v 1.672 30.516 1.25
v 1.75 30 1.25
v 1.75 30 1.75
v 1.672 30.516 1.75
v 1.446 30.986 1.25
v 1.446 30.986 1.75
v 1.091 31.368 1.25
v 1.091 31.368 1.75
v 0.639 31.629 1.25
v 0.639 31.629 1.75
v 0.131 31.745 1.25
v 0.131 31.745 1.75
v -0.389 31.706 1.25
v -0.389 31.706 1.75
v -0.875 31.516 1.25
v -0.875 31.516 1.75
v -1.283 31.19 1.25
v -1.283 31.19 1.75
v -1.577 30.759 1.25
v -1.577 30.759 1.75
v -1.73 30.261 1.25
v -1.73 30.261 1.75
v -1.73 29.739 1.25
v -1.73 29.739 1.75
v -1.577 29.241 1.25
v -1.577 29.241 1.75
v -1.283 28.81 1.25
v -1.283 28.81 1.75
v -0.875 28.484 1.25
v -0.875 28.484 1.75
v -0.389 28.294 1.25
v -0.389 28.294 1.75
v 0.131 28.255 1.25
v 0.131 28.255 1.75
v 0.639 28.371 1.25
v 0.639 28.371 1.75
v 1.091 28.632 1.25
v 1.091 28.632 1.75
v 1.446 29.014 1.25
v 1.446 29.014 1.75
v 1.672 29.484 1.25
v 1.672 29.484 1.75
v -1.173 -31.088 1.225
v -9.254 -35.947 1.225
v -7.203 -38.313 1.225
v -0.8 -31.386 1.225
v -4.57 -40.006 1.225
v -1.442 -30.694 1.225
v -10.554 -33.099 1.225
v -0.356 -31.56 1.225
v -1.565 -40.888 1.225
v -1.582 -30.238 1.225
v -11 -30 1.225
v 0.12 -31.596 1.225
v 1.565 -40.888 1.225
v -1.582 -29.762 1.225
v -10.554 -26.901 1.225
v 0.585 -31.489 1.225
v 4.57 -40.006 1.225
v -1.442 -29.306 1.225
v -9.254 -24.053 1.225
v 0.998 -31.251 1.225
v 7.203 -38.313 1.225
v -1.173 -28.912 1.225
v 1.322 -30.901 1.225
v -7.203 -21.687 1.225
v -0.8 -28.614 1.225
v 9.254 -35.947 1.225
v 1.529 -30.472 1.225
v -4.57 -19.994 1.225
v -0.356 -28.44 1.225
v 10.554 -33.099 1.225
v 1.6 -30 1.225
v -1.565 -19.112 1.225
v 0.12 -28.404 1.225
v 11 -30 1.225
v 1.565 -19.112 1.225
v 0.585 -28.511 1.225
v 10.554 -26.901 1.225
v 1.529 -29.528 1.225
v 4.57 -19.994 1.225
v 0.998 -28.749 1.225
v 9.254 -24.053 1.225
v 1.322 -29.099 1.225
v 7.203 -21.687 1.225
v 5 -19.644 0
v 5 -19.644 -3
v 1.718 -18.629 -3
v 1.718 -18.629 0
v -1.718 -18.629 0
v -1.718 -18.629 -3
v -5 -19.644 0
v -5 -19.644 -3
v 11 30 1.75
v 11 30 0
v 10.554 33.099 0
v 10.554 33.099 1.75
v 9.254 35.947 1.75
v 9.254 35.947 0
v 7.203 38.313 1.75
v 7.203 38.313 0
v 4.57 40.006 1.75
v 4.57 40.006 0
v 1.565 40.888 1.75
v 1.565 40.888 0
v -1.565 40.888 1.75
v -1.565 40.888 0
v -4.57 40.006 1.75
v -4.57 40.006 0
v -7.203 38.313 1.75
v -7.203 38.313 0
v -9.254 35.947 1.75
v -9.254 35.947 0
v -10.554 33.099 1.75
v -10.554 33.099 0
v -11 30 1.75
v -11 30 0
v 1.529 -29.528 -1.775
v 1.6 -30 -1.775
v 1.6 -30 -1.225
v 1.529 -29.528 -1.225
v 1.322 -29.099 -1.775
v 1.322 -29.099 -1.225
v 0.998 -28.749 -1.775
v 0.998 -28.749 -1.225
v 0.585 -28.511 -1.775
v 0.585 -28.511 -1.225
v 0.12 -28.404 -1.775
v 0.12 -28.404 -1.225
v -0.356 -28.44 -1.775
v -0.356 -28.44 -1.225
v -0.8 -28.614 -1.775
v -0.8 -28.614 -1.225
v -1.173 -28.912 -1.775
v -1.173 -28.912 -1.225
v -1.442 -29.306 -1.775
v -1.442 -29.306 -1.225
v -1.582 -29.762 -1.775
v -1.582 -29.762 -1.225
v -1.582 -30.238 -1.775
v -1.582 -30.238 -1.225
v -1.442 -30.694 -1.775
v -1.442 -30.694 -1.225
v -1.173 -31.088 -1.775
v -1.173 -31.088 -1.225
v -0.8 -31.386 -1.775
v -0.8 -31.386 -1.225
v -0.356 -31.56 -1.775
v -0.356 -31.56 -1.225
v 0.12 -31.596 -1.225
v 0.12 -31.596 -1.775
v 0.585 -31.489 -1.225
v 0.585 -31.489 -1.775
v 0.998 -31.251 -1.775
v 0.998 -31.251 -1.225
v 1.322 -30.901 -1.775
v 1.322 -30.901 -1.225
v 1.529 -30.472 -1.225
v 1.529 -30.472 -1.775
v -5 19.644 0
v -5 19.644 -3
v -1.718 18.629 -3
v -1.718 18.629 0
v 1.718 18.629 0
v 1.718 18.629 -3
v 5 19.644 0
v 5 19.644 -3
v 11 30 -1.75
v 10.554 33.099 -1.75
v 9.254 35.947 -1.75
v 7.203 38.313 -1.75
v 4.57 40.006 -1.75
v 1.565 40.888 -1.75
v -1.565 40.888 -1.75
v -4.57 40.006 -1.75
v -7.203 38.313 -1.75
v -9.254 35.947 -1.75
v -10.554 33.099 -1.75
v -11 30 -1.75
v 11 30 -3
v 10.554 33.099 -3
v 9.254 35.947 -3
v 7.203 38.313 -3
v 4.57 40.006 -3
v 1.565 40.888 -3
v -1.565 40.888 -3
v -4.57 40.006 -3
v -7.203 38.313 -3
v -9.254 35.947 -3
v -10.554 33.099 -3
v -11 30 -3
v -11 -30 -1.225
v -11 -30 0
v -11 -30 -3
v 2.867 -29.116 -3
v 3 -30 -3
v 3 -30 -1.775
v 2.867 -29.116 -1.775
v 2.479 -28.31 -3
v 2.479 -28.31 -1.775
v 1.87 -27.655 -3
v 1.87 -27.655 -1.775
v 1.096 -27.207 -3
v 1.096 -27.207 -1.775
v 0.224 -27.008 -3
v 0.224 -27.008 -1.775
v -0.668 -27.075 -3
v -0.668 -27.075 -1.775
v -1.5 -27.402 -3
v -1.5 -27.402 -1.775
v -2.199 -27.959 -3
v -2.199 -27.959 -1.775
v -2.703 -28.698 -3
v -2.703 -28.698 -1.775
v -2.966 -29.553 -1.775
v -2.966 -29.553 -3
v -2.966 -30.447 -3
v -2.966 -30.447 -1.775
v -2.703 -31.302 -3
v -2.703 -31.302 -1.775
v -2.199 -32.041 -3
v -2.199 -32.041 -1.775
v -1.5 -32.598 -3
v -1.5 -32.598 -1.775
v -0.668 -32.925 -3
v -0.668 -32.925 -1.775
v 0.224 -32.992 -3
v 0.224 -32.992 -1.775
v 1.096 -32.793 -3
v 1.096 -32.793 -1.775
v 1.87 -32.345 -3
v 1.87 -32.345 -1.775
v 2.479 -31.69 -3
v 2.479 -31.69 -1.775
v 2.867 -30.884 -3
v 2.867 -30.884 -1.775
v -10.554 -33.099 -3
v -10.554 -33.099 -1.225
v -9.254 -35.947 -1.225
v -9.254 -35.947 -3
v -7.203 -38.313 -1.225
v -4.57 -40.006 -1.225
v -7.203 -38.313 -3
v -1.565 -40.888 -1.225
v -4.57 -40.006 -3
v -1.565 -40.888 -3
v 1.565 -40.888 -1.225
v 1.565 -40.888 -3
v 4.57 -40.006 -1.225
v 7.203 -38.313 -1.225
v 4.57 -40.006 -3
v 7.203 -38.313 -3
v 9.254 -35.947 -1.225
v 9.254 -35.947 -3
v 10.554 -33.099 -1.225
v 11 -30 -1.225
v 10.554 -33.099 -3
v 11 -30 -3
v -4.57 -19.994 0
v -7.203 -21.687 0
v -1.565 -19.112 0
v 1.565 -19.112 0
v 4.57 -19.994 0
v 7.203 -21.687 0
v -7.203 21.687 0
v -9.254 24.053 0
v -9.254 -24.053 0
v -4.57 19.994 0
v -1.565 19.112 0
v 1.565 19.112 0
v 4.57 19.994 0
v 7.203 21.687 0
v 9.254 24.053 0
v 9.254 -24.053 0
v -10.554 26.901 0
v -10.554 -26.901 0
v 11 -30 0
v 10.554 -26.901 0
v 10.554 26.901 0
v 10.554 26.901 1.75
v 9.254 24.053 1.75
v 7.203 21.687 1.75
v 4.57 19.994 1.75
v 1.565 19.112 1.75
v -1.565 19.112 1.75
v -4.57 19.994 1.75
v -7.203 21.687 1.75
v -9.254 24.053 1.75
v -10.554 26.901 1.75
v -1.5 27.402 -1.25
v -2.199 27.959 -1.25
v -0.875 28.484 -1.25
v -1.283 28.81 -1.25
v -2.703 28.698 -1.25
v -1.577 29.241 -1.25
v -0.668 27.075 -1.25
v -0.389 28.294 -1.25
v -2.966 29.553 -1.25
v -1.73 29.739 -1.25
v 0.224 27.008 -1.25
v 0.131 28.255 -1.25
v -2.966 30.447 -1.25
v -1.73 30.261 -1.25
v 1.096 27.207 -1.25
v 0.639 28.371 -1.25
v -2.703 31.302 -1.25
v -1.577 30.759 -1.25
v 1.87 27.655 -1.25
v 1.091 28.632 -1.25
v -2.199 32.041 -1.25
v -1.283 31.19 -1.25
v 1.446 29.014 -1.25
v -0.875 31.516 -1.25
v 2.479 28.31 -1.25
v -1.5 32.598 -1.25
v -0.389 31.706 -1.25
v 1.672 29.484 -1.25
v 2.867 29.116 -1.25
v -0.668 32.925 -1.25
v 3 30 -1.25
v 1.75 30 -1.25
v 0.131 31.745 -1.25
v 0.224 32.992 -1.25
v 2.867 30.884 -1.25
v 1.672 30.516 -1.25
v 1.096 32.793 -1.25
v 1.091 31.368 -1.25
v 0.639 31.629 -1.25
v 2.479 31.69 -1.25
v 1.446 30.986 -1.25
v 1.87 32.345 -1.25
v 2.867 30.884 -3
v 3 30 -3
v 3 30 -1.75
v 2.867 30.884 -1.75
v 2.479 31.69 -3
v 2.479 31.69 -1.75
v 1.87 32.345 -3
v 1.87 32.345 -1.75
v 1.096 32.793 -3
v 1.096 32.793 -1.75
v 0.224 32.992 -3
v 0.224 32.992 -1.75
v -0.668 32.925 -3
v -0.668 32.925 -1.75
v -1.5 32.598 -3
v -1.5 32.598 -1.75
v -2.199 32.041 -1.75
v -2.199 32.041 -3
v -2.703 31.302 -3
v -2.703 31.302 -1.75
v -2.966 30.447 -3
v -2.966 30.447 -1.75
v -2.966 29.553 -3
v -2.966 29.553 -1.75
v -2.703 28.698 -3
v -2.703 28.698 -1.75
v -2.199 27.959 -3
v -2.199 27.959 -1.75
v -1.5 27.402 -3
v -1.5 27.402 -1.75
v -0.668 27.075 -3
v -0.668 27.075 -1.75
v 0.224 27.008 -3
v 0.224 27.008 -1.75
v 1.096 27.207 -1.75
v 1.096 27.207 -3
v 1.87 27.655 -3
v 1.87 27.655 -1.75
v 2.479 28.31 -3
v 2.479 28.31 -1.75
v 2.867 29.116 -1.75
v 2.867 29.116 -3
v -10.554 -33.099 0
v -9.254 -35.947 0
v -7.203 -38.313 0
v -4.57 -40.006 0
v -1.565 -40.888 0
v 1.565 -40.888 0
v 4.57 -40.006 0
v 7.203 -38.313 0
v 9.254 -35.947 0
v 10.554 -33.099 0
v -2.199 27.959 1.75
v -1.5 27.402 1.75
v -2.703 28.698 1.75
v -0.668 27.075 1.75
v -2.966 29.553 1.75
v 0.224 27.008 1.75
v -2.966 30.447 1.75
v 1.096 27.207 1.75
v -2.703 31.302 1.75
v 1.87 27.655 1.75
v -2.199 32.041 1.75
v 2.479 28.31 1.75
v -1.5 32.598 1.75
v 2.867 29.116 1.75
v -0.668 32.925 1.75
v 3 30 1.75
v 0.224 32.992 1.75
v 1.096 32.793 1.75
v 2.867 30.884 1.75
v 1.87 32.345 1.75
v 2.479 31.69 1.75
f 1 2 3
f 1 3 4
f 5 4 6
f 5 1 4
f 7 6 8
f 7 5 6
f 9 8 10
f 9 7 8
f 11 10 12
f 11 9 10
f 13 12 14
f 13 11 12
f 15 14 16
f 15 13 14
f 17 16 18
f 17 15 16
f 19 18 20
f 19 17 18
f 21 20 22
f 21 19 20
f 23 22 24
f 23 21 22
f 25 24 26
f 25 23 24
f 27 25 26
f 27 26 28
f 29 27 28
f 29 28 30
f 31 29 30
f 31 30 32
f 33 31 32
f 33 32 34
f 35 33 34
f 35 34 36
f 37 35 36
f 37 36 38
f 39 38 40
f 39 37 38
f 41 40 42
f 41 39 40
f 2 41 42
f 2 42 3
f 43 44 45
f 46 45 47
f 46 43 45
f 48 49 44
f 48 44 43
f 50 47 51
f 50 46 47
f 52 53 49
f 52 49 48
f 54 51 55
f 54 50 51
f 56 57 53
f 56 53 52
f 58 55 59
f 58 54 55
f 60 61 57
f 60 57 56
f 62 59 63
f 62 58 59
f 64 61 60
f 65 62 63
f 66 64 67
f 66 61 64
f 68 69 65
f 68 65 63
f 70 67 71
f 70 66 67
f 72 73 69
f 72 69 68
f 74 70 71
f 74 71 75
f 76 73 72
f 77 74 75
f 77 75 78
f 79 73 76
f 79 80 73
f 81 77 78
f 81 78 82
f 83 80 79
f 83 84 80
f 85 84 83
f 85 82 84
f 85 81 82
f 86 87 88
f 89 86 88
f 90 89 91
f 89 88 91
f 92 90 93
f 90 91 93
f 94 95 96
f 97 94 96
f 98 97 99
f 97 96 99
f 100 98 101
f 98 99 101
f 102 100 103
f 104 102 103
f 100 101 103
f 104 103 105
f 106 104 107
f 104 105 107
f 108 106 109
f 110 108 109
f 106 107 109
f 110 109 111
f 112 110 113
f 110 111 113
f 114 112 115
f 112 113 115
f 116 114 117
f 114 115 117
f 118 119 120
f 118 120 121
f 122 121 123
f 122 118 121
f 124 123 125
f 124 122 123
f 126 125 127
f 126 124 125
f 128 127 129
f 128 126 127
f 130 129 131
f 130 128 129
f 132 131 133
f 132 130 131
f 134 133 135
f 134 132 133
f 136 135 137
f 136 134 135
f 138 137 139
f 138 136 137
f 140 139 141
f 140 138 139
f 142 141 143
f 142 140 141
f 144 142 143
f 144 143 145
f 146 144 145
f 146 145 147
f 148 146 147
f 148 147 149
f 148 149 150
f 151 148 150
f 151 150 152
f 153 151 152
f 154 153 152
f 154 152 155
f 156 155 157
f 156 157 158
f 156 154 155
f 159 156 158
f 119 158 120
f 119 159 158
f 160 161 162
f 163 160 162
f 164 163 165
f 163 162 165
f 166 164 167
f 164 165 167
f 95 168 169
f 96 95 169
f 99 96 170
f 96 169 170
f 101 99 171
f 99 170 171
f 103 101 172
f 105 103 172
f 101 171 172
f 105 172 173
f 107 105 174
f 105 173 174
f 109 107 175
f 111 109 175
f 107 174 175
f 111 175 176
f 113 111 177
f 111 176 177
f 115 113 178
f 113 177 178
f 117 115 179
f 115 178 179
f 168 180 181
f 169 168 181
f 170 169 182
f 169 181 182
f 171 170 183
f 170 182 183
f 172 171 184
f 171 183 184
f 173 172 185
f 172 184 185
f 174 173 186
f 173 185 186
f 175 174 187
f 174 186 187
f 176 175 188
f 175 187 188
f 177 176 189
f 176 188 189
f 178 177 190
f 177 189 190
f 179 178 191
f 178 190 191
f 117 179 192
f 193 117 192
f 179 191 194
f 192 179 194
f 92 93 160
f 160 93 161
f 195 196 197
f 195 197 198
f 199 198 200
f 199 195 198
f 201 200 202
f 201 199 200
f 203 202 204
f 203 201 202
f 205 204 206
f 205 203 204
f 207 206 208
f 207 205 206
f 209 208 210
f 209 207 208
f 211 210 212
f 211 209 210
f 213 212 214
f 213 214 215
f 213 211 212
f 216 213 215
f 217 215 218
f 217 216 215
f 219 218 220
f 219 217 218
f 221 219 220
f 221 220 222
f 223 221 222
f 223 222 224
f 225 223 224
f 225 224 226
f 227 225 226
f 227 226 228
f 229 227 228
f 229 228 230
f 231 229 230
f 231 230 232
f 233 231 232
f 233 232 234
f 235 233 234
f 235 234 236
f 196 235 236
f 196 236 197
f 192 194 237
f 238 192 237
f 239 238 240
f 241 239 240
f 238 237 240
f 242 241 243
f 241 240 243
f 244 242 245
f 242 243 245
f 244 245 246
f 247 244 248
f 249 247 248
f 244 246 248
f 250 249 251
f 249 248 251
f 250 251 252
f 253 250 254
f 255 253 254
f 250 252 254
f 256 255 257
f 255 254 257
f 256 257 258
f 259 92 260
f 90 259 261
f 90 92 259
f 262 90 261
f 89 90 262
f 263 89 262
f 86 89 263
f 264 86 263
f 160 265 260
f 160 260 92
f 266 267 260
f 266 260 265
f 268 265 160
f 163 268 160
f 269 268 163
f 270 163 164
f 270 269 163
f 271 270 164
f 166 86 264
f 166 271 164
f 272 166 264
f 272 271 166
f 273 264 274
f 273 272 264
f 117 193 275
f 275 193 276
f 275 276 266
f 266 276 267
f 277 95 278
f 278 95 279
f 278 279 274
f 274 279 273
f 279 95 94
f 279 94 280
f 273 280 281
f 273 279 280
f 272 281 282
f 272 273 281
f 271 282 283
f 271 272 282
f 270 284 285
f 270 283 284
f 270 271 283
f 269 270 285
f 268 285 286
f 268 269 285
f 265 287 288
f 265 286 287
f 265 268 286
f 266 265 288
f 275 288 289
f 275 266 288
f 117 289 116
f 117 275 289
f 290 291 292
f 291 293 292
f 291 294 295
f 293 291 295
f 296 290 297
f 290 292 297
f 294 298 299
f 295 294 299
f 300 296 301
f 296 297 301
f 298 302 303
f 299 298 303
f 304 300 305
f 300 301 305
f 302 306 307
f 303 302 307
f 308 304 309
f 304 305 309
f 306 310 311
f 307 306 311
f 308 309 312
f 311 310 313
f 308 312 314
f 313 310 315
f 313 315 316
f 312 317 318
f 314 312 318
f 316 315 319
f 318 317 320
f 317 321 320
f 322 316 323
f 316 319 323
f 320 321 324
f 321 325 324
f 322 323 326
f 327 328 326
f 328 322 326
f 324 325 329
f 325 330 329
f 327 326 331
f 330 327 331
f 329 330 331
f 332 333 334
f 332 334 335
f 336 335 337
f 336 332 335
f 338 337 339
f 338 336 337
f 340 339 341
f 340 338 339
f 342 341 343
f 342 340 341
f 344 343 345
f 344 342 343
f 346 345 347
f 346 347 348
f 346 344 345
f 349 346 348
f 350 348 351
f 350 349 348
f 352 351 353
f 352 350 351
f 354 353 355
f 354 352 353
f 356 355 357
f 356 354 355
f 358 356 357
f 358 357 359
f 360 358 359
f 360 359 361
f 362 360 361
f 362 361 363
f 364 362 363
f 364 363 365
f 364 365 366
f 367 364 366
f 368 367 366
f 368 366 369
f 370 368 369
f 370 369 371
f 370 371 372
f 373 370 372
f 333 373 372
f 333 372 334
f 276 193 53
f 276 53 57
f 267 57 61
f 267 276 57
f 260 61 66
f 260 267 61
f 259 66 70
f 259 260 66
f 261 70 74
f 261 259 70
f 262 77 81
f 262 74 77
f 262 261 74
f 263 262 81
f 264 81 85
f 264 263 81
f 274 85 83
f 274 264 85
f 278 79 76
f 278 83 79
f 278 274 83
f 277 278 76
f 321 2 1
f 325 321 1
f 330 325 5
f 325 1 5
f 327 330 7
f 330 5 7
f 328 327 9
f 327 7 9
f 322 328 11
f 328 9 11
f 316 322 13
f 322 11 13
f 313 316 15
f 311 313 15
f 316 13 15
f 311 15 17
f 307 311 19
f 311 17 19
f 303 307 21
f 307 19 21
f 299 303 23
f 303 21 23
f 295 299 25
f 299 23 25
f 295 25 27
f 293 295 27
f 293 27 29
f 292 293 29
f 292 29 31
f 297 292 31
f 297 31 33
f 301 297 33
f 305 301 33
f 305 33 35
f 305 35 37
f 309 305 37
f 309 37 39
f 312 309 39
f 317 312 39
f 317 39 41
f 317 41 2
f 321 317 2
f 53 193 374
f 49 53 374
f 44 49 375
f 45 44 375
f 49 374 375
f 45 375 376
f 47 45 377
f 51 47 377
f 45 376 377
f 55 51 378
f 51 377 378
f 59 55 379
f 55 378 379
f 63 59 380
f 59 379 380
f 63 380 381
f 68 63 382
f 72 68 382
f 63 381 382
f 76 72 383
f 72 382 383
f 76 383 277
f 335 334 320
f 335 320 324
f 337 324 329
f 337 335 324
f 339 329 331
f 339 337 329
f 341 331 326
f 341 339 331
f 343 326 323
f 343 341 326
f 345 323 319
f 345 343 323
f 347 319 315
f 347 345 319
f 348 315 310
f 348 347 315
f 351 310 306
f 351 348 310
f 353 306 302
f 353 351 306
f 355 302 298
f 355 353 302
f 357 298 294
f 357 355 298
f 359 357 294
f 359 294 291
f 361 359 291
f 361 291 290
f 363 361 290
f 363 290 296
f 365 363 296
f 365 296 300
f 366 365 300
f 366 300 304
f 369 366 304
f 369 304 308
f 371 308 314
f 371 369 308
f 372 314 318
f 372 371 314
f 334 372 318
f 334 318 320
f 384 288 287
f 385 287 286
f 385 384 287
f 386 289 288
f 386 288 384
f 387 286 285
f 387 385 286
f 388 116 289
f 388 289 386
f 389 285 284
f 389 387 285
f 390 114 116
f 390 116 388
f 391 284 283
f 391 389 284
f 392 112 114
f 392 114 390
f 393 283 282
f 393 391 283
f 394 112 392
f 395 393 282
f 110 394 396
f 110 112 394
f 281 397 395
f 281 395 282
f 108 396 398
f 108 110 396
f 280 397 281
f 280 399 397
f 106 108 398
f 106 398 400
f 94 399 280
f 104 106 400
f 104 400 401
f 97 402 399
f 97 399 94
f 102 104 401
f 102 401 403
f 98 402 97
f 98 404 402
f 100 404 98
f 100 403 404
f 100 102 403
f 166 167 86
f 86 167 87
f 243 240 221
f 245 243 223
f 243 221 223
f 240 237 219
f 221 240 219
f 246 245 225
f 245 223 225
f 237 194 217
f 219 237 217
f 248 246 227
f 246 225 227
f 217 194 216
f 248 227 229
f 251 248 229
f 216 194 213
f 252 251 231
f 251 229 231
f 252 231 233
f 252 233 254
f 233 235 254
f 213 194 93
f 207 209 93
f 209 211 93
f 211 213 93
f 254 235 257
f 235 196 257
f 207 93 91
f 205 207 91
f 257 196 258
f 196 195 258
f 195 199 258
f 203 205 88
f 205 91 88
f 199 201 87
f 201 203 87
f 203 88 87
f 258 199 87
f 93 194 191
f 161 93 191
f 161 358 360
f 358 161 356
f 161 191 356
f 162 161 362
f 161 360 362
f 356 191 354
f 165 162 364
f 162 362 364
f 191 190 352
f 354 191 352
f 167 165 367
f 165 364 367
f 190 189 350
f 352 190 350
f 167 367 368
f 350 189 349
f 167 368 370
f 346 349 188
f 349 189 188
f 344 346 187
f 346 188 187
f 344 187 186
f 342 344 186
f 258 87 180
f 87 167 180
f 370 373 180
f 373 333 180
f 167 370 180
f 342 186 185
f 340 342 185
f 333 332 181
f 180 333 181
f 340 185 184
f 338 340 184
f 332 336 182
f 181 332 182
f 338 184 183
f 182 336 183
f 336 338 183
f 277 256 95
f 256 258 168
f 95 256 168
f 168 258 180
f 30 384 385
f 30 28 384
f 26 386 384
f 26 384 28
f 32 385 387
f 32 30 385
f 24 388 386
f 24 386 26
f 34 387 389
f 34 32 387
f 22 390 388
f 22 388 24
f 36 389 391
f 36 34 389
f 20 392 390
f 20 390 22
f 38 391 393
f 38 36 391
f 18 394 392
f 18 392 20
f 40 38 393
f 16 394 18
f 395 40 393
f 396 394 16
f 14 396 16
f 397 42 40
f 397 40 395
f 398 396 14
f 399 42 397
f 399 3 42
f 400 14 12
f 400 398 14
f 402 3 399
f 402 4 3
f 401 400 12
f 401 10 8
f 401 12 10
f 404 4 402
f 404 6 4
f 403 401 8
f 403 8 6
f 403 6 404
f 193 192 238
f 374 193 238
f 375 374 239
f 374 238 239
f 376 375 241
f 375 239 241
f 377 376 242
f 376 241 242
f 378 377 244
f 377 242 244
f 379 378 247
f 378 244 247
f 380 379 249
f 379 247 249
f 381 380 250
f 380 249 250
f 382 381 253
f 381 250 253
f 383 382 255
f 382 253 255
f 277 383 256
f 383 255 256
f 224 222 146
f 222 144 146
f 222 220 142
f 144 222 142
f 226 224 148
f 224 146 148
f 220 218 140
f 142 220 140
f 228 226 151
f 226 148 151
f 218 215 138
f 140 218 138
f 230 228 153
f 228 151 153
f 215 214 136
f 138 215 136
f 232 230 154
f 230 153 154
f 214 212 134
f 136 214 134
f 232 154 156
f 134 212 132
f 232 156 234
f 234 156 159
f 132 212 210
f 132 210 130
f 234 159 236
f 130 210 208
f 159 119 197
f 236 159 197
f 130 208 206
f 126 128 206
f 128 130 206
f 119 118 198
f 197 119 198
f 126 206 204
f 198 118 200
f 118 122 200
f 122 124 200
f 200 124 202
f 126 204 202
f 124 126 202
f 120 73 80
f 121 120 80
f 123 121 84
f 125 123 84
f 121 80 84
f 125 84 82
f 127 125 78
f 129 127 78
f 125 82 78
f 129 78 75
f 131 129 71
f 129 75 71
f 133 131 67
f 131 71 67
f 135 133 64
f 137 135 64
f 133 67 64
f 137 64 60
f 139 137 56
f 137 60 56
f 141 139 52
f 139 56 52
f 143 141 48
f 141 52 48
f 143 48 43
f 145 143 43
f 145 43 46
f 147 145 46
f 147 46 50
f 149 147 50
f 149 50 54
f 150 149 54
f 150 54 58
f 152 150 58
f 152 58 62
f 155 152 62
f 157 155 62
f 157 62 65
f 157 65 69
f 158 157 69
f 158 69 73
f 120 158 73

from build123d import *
from build123d.topology import SkipClean

# Parameters (mm, degrees)
BOSS_EXTRUDE1_DEPTH           = 3
BOSS_EXTRUDE2_START           = -1.75
SKETCH1_3_R                   = 11
BOSS_EXTRUDE2_DEPTH           = 1.75
SKETCH2_R                     = 1.75
CUT_EXTRUDE1_DEPTH            = 4.75
SKETCH2_3_R                   = 3
CUT_EXTRUDE2_DEPTH            = 1.75
BOSS_EXTRUDE3_START           = -1.225
SKETCH1_4_R                   = 11
BOSS_EXTRUDE3_DEPTH           = 1.225
SKETCH3_R                     = 1.6
CUT_EXTRUDE3_DEPTH            = 4.225
SKETCH3_3_R                   = 3
SKETCH3_3_R_2                 = 1.6
CUT_EXTRUDE4_DEPTH            = 1.225
BODY_MOVE_COPY1_DEPTH         = 3
BODY_MOVE_COPY1_START         = 1.75
BODY_MOVE_COPY1_2_OUTLINE_R   = 11
BODY_MOVE_COPY1_2_OUTLINE_R_2 = 1.6
BODY_MOVE_COPY1_2_OUTLINE_R_3 = 3
BODY_MOVE_COPY1_2_DEPTH       = 1.25
BODY_MOVE_COPY1_START_2       = 1.225
BODY_MOVE_COPY1_3_OUTLINE_R   = 11
BODY_MOVE_COPY1_3_OUTLINE_R_2 = 1.6
BODY_MOVE_COPY1_3_DEPTH       = 0.525
BODY_MOVE_COPY1_START_3       = -1.75
BODY_MOVE_COPY1_4_OUTLINE_R   = 3
BODY_MOVE_COPY1_4_OUTLINE_R_2 = 1.75
BODY_MOVE_COPY1_4_DEPTH       = 0.5
BODY_MOVE_COPY1_START_4       = -3
BODY_MOVE_COPY1_5_OUTLINE_R   = 3
BODY_MOVE_COPY1_5_DEPTH       = 3
BODY_MOVE_COPY1_START_5       = -1.775
BODY_MOVE_COPY1_6_OUTLINE_R   = 3
BODY_MOVE_COPY1_6_OUTLINE_R_2 = 1.6
BODY_MOVE_COPY1_6_DEPTH       = 0.55
BODY_MOVE_COPY1_START_6       = 1.25
BODY_MOVE_COPY1_7_OUTLINE_R   = 3
BODY_MOVE_COPY1_7_OUTLINE_R_2 = 1.75
BODY_MOVE_COPY1_7_DEPTH       = 0.5


# Read off the part's stored shape, not the designer's step: Body-Move/Copy1
with BuildPart() as part:
    # Sketch1 → Boss-Extrude1 (new body)
    with BuildSketch(Plane.XY):
        with BuildLine():
            Line((-11, 30), (-11, -30))
            ThreePointArc((-11, -30), (0, -41), (11, -30))
            Line((11, -30), (11, 30))
            ThreePointArc((11, 30), (0, 41), (-11, 30))
        make_face()
        with BuildLine():
            ThreePointArc((5, -19.643842411), (0, -18.5), (-5, -19.643842411))
            Line((-5, -19.643842411), (-5, 19.643842411))
            ThreePointArc((-5, 19.643842411), (0, 18.5), (5, 19.643842411))
            Line((5, 19.643842411), (5, -19.643842411))
        make_face(mode=Mode.SUBTRACT)
    extrude(amount=BOSS_EXTRUDE1_DEPTH)

    # Sketch1<3> → Boss-Extrude2 (add)
    with BuildSketch(Plane.XY.offset(BOSS_EXTRUDE2_START)):
        with Locations((0, 30)):
            Circle(SKETCH1_3_R)
    extrude(amount=BOSS_EXTRUDE2_DEPTH)

    # Sketch2 → Cut-Extrude1 (cut)
    with BuildSketch(Plane.XY.offset(3)):
        with Locations((0, 30)):
            Circle(SKETCH2_R)
    extrude(amount=-CUT_EXTRUDE1_DEPTH, mode=Mode.SUBTRACT)

    # Sketch2<3> → Cut-Extrude2 (cut)
    with BuildSketch(Plane.XY.offset(3)):
        with Locations((0, 30)):
            Circle(SKETCH2_3_R)
    extrude(amount=-CUT_EXTRUDE2_DEPTH, mode=Mode.SUBTRACT)

    # Sketch1<4> → Boss-Extrude3 (add)
    with SkipClean():  # the faces are left unmerged after this step: merging them gives an invalid solid
        with BuildSketch(Plane.XY.offset(BOSS_EXTRUDE3_START)):
            with Locations((0, -30)):
                Circle(SKETCH1_4_R)
        extrude(amount=BOSS_EXTRUDE3_DEPTH)

    # Sketch3 → Cut-Extrude3 (cut)
    with SkipClean():  # the faces are left unmerged after this step: merging them gives an invalid solid
        with BuildSketch(Plane.XY.offset(3)):
            with Locations((0, -30)):
                Circle(SKETCH3_R)
        extrude(amount=-CUT_EXTRUDE3_DEPTH, mode=Mode.SUBTRACT)

    # Sketch3<3> → Cut-Extrude4 (cut)
    with SkipClean():  # the faces are left unmerged after this step: merging them gives an invalid solid
        with BuildSketch(Plane.XY.offset(3)):
            with Locations((0, -30)):
                Circle(SKETCH3_3_R)
            with Locations((0, -30)):
                Circle(SKETCH3_3_R_2, mode=Mode.SUBTRACT)
        extrude(amount=-CUT_EXTRUDE4_DEPTH, mode=Mode.SUBTRACT)

    # Body-Move/Copy1 outline → Body-Move/Copy1 (cut)
    with SkipClean():  # the faces are left unmerged after this step: merging them gives an invalid solid
        with BuildSketch(Plane.XY):
            with BuildLine():
                Line((-11, 30), (-11, -30))
                ThreePointArc((-11, -30), (0, -19), (11, -30))
                Line((11, -30), (11, 30))
                ThreePointArc((11, 30), (0, 19), (-11, 30))
            make_face()
            with BuildLine():
                Line((-5, -19.643842411), (-5, 19.643842411))
                ThreePointArc((-5, 19.643842411), (0, 18.5), (5, 19.643842411))
                Line((5, 19.643842411), (5, -19.643842411))
                ThreePointArc((5, -19.643842411), (0, -18.5), (-5, -19.643842411))
            make_face(mode=Mode.SUBTRACT)
        extrude(amount=BODY_MOVE_COPY1_DEPTH, mode=Mode.SUBTRACT)

    # Body-Move_Copy1 2 outline → Body-Move_Copy1 2 (cut)
    # profile 1 of 2: a face of its own
    with SkipClean():  # the faces are left unmerged after this step: merging them gives an invalid solid
        with BuildSketch(Plane.XY.offset(BODY_MOVE_COPY1_START)):
            with Locations((0, -30)):
                Circle(BODY_MOVE_COPY1_2_OUTLINE_R)
            with Locations((0, -30)):
                Circle(BODY_MOVE_COPY1_2_OUTLINE_R_2, mode=Mode.SUBTRACT)
        # profile 2 of 2: a face of its own
        with BuildSketch(Plane.XY.offset(BODY_MOVE_COPY1_START)):
            with Locations((0, 30)):
                Circle(BODY_MOVE_COPY1_2_OUTLINE_R)
            with Locations((0, 30)):
                Circle(BODY_MOVE_COPY1_2_OUTLINE_R_3, mode=Mode.SUBTRACT)
        extrude(amount=BODY_MOVE_COPY1_2_DEPTH, mode=Mode.SUBTRACT)

    # Body-Move_Copy1 3 outline → Body-Move_Copy1 3 (cut)
    with SkipClean():  # the faces are left unmerged after this step: merging them gives an invalid solid
        with BuildSketch(Plane.XY.offset(BODY_MOVE_COPY1_START_2)):
            with Locations((0, -30)):
                Circle(BODY_MOVE_COPY1_3_OUTLINE_R)
            with Locations((0, -30)):
                Circle(BODY_MOVE_COPY1_3_OUTLINE_R_2, mode=Mode.SUBTRACT)
        extrude(amount=BODY_MOVE_COPY1_3_DEPTH, mode=Mode.SUBTRACT)

    # Body-Move_Copy1 4 outline → Body-Move_Copy1 4 (cut)
    with SkipClean():  # the faces are left unmerged after this step: merging them gives an invalid solid
        with BuildSketch(Plane.XY.offset(BODY_MOVE_COPY1_START_3)):
            with Locations((0, 30)):
                Circle(BODY_MOVE_COPY1_4_OUTLINE_R)
            with Locations((0, 30)):
                Circle(BODY_MOVE_COPY1_4_OUTLINE_R_2, mode=Mode.SUBTRACT)
        extrude(amount=BODY_MOVE_COPY1_4_DEPTH, mode=Mode.SUBTRACT)

    # Body-Move_Copy1 5 outline → Body-Move_Copy1 5 (add)
    with BuildSketch(Plane.XY.offset(BODY_MOVE_COPY1_START_4)):
        with BuildLine():
            Line((-11, 30), (-11, -30))
            ThreePointArc((-11, -30), (0, -41), (11, -30))
            Line((11, -30), (11, 30))
            ThreePointArc((11, 30), (0, 41), (-11, 30))
        make_face()
        with BuildLine():
            Line((-5, -19.643842411), (-5, 19.643842411))
            ThreePointArc((-5, 19.643842411), (0, 18.5), (5, 19.643842411))
            Line((5, 19.643842411), (5, -19.643842411))
            ThreePointArc((5, -19.643842411), (0, -18.5), (-5, -19.643842411))
        make_face(mode=Mode.SUBTRACT)
        with Locations((0, 30)):
            Circle(BODY_MOVE_COPY1_5_OUTLINE_R, mode=Mode.SUBTRACT)
        with Locations((0, -30)):
            Circle(BODY_MOVE_COPY1_5_OUTLINE_R, mode=Mode.SUBTRACT)
    extrude(amount=BODY_MOVE_COPY1_5_DEPTH)

    # Body-Move_Copy1 6 outline → Body-Move_Copy1 6 (add)
    with SkipClean():  # the faces are left unmerged after this step: merging them gives an invalid solid
        with BuildSketch(Plane.XY.offset(BODY_MOVE_COPY1_START_5)):
            with Locations((0, -30)):
                Circle(BODY_MOVE_COPY1_6_OUTLINE_R)
            with Locations((0, -30)):
                Circle(BODY_MOVE_COPY1_6_OUTLINE_R_2, mode=Mode.SUBTRACT)
        extrude(amount=BODY_MOVE_COPY1_6_DEPTH)

    # Body-Move_Copy1 7 outline → Body-Move_Copy1 7 (add)
    with BuildSketch(Plane.XY.offset(BODY_MOVE_COPY1_START_6)):
        with Locations((0, 30)):
            Circle(BODY_MOVE_COPY1_7_OUTLINE_R)
        with Locations((0, 30)):
            Circle(BODY_MOVE_COPY1_7_OUTLINE_R_2, mode=Mode.SUBTRACT)
    extrude(amount=BODY_MOVE_COPY1_7_DEPTH)


solid = part.part
